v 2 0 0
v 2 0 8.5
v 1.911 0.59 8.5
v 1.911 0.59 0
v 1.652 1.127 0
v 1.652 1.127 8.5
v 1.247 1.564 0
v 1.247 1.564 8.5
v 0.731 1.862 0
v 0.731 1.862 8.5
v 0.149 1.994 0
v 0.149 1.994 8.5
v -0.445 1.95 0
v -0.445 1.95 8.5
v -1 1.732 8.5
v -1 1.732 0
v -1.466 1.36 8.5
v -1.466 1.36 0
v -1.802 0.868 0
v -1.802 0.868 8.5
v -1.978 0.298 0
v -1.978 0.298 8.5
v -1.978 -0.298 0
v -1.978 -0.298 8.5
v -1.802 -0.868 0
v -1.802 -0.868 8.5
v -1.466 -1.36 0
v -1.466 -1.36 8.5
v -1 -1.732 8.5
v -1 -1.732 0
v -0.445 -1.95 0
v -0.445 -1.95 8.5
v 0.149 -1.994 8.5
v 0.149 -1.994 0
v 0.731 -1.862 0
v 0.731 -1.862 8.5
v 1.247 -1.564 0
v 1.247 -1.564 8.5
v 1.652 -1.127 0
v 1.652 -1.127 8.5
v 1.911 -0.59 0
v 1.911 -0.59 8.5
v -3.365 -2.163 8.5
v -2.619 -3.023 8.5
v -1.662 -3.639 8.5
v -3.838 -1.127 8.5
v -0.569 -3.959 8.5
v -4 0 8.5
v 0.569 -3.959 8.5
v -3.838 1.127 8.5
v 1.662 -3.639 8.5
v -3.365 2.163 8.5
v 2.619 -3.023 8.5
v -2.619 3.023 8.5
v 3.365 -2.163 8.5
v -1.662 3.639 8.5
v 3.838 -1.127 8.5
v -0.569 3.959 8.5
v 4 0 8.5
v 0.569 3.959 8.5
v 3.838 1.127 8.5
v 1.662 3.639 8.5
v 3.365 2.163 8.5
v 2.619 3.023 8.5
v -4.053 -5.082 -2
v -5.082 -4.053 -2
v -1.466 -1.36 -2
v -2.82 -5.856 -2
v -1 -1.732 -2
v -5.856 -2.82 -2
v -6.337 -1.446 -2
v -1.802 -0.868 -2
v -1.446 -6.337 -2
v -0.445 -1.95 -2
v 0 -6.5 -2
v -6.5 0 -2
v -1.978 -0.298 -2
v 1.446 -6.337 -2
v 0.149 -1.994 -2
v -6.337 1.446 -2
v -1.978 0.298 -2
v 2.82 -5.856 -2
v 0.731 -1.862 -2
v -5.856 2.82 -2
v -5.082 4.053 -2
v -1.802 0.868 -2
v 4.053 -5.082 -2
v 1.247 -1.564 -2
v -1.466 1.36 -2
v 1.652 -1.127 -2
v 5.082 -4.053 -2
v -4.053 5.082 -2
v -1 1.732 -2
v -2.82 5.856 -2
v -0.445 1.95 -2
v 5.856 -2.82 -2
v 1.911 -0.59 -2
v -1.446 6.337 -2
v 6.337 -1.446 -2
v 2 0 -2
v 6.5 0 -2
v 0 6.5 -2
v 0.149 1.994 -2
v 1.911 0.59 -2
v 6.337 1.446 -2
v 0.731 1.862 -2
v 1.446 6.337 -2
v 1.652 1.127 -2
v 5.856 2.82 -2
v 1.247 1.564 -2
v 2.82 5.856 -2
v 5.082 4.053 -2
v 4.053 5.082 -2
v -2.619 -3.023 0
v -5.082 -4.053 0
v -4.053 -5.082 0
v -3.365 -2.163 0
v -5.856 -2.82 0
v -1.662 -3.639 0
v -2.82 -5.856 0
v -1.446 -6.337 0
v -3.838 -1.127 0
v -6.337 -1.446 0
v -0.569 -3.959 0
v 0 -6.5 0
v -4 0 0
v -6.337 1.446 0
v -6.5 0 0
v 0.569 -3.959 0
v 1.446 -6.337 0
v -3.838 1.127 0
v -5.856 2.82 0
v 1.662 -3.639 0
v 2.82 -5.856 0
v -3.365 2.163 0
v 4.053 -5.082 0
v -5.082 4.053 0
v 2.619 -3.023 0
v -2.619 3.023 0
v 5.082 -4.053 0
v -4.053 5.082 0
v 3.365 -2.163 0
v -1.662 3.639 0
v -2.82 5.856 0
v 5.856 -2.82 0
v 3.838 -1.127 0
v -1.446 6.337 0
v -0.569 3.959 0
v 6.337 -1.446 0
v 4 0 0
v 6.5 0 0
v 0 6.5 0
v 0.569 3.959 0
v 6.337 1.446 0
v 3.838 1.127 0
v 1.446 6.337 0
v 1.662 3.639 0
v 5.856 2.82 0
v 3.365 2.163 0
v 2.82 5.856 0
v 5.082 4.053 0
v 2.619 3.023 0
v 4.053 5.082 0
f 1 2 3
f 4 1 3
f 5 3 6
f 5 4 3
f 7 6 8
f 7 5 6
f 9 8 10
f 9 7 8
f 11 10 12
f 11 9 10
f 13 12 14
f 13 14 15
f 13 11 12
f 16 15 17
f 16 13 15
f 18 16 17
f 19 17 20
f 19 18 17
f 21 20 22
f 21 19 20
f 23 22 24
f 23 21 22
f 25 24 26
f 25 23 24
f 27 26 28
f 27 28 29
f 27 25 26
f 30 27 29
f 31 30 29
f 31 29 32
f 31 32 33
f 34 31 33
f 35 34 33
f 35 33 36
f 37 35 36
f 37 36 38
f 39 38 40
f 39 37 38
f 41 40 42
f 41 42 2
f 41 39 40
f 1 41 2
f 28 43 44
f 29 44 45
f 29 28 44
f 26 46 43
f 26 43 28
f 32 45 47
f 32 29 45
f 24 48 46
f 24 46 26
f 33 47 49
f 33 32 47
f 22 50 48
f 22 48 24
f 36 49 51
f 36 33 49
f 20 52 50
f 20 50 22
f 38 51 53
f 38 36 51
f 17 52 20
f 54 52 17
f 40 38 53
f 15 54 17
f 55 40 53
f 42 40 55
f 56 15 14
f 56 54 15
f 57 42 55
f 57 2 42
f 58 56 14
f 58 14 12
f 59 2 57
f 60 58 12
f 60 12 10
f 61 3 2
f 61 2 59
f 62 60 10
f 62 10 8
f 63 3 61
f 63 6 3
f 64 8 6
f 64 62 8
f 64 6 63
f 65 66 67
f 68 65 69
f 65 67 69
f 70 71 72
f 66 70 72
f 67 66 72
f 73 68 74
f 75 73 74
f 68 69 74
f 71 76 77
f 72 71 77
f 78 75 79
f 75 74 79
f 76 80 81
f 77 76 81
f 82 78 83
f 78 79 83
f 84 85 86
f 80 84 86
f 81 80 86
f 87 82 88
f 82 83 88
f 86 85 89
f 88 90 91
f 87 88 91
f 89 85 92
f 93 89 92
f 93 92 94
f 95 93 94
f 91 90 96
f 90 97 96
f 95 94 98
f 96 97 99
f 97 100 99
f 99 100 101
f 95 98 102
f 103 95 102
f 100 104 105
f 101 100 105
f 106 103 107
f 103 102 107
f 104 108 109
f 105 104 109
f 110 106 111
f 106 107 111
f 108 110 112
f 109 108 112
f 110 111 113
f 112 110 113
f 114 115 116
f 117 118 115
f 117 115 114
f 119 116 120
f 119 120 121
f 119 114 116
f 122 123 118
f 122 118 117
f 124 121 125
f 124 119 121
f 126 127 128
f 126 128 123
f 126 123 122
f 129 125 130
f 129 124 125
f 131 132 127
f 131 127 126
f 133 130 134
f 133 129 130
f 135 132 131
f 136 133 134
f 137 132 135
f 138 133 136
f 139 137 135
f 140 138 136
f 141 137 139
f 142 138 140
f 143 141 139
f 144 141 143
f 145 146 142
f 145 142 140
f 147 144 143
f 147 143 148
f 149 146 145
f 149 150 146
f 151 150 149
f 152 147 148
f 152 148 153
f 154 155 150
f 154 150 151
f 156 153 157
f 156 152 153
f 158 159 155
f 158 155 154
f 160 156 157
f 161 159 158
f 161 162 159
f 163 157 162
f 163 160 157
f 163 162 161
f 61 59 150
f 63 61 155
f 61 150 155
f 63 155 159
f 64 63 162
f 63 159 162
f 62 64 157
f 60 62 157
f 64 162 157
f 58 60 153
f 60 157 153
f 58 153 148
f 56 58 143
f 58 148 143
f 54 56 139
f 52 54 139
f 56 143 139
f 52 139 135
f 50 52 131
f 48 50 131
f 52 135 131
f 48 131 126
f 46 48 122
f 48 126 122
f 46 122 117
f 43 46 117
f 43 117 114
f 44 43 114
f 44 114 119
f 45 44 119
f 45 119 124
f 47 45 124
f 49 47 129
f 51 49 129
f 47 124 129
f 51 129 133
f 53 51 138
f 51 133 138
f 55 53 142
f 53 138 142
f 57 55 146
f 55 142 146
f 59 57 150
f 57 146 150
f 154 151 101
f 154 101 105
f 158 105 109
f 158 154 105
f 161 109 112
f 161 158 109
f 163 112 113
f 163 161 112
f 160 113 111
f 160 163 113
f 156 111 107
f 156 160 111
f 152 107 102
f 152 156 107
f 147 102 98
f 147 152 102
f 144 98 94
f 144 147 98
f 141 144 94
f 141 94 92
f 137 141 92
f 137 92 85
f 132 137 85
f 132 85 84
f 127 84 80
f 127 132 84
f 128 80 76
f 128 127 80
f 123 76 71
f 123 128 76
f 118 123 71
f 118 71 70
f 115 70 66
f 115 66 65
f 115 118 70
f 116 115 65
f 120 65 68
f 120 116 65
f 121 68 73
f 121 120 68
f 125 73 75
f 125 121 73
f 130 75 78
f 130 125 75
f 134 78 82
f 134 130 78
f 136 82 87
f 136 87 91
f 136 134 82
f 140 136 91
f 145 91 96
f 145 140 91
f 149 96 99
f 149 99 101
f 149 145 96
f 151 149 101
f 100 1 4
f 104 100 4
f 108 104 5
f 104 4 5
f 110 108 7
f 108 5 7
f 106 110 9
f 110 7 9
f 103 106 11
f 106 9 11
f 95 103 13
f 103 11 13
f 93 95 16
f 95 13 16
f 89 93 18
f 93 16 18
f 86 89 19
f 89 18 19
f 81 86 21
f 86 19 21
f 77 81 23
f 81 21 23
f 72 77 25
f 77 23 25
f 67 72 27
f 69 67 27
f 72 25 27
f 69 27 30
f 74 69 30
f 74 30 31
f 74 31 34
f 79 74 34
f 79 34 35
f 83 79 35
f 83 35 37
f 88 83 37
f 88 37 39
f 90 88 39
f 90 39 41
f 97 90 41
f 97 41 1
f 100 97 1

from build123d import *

# Parameters (mm, degrees)
F0_R     = 4
F0_R_2   = 2
F1_DEPTH = 8.5
F2_R     = 6.5
F3_DEPTH = 2
F4_DEPTH = 3


with BuildPart() as f1:
    # F0 (on Top) → F1 (new body)
    with BuildSketch(Plane.XY):
        Circle(F0_R)
        Circle(F0_R_2, mode=Mode.SUBTRACT)
    extrude(amount=F1_DEPTH)

    # F2 (on Top) → F3 (join)
    with BuildSketch(Plane.XY):
        Circle(F2_R)
    extrude(amount=-F3_DEPTH)

    # F0 (on Top) → F4 (cut)
    with BuildSketch(Plane.XY):
        Circle(F0_R_2)
    extrude(amount=-F4_DEPTH, mode=Mode.SUBTRACT)


solid = f1.part
